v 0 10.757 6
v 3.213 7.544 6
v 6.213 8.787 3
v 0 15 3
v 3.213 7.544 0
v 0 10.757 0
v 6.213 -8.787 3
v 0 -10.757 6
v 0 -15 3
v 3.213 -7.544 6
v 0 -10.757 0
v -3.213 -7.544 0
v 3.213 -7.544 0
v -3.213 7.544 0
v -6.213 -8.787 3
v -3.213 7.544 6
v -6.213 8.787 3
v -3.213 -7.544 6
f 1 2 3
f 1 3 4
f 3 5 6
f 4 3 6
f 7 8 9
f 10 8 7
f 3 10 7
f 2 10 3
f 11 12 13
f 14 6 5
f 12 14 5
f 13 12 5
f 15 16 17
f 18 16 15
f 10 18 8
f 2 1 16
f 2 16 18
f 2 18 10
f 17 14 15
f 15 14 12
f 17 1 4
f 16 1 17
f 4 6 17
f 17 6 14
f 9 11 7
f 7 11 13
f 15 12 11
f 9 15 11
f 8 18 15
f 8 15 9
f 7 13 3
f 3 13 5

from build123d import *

# Parameters (mm, degrees)
F1_DEPTH = 6
F2_SIZE  = 2.99999


# Not quite as in the source:
# - a fillet or chamfer is up to 0.001 mm smaller than in the source, because OpenCascade refuses the exact size


with BuildPart() as f1:
    # F0 (on Top) → F1 (new body)
    with BuildSketch(Plane.XY):
        Polygon((-6.2132034356, 8.7867965644), (-6.2132034356, 0), (-6.2132034356, -8.7867965644), (0, -15), (6.2132034356, -8.7867965644), (6.2132034356, 0), (6.2132034356, 8.7867965644), (0, 15), align=None)
    extrude(amount=F1_DEPTH)

    # F2 (size 3 in the source; OpenCascade refuses exactly that, so slightly less here)
    f2_edges = [f1.edges().sort_by_distance(p)[0] for p in [
        (-3.106602, 11.893398, 6),
        (3.106602, 11.893398, 6),
        (6.213203, 0, 6),
        (-6.213203, 0, 6),
        (-3.106602, -11.893398, 6),
        (3.106602, -11.893398, 6),
        (-3.106602, 11.893398, 0),
        (-6.213203, 0, 0),
        (-3.106602, -11.893398, 0),
        (3.106602, -11.893398, 0),
        (6.213203, 0, 0),
        (3.106602, 11.893398, 0),
    ]]
    chamfer(f2_edges, length=F2_SIZE)


solid = f1.part
